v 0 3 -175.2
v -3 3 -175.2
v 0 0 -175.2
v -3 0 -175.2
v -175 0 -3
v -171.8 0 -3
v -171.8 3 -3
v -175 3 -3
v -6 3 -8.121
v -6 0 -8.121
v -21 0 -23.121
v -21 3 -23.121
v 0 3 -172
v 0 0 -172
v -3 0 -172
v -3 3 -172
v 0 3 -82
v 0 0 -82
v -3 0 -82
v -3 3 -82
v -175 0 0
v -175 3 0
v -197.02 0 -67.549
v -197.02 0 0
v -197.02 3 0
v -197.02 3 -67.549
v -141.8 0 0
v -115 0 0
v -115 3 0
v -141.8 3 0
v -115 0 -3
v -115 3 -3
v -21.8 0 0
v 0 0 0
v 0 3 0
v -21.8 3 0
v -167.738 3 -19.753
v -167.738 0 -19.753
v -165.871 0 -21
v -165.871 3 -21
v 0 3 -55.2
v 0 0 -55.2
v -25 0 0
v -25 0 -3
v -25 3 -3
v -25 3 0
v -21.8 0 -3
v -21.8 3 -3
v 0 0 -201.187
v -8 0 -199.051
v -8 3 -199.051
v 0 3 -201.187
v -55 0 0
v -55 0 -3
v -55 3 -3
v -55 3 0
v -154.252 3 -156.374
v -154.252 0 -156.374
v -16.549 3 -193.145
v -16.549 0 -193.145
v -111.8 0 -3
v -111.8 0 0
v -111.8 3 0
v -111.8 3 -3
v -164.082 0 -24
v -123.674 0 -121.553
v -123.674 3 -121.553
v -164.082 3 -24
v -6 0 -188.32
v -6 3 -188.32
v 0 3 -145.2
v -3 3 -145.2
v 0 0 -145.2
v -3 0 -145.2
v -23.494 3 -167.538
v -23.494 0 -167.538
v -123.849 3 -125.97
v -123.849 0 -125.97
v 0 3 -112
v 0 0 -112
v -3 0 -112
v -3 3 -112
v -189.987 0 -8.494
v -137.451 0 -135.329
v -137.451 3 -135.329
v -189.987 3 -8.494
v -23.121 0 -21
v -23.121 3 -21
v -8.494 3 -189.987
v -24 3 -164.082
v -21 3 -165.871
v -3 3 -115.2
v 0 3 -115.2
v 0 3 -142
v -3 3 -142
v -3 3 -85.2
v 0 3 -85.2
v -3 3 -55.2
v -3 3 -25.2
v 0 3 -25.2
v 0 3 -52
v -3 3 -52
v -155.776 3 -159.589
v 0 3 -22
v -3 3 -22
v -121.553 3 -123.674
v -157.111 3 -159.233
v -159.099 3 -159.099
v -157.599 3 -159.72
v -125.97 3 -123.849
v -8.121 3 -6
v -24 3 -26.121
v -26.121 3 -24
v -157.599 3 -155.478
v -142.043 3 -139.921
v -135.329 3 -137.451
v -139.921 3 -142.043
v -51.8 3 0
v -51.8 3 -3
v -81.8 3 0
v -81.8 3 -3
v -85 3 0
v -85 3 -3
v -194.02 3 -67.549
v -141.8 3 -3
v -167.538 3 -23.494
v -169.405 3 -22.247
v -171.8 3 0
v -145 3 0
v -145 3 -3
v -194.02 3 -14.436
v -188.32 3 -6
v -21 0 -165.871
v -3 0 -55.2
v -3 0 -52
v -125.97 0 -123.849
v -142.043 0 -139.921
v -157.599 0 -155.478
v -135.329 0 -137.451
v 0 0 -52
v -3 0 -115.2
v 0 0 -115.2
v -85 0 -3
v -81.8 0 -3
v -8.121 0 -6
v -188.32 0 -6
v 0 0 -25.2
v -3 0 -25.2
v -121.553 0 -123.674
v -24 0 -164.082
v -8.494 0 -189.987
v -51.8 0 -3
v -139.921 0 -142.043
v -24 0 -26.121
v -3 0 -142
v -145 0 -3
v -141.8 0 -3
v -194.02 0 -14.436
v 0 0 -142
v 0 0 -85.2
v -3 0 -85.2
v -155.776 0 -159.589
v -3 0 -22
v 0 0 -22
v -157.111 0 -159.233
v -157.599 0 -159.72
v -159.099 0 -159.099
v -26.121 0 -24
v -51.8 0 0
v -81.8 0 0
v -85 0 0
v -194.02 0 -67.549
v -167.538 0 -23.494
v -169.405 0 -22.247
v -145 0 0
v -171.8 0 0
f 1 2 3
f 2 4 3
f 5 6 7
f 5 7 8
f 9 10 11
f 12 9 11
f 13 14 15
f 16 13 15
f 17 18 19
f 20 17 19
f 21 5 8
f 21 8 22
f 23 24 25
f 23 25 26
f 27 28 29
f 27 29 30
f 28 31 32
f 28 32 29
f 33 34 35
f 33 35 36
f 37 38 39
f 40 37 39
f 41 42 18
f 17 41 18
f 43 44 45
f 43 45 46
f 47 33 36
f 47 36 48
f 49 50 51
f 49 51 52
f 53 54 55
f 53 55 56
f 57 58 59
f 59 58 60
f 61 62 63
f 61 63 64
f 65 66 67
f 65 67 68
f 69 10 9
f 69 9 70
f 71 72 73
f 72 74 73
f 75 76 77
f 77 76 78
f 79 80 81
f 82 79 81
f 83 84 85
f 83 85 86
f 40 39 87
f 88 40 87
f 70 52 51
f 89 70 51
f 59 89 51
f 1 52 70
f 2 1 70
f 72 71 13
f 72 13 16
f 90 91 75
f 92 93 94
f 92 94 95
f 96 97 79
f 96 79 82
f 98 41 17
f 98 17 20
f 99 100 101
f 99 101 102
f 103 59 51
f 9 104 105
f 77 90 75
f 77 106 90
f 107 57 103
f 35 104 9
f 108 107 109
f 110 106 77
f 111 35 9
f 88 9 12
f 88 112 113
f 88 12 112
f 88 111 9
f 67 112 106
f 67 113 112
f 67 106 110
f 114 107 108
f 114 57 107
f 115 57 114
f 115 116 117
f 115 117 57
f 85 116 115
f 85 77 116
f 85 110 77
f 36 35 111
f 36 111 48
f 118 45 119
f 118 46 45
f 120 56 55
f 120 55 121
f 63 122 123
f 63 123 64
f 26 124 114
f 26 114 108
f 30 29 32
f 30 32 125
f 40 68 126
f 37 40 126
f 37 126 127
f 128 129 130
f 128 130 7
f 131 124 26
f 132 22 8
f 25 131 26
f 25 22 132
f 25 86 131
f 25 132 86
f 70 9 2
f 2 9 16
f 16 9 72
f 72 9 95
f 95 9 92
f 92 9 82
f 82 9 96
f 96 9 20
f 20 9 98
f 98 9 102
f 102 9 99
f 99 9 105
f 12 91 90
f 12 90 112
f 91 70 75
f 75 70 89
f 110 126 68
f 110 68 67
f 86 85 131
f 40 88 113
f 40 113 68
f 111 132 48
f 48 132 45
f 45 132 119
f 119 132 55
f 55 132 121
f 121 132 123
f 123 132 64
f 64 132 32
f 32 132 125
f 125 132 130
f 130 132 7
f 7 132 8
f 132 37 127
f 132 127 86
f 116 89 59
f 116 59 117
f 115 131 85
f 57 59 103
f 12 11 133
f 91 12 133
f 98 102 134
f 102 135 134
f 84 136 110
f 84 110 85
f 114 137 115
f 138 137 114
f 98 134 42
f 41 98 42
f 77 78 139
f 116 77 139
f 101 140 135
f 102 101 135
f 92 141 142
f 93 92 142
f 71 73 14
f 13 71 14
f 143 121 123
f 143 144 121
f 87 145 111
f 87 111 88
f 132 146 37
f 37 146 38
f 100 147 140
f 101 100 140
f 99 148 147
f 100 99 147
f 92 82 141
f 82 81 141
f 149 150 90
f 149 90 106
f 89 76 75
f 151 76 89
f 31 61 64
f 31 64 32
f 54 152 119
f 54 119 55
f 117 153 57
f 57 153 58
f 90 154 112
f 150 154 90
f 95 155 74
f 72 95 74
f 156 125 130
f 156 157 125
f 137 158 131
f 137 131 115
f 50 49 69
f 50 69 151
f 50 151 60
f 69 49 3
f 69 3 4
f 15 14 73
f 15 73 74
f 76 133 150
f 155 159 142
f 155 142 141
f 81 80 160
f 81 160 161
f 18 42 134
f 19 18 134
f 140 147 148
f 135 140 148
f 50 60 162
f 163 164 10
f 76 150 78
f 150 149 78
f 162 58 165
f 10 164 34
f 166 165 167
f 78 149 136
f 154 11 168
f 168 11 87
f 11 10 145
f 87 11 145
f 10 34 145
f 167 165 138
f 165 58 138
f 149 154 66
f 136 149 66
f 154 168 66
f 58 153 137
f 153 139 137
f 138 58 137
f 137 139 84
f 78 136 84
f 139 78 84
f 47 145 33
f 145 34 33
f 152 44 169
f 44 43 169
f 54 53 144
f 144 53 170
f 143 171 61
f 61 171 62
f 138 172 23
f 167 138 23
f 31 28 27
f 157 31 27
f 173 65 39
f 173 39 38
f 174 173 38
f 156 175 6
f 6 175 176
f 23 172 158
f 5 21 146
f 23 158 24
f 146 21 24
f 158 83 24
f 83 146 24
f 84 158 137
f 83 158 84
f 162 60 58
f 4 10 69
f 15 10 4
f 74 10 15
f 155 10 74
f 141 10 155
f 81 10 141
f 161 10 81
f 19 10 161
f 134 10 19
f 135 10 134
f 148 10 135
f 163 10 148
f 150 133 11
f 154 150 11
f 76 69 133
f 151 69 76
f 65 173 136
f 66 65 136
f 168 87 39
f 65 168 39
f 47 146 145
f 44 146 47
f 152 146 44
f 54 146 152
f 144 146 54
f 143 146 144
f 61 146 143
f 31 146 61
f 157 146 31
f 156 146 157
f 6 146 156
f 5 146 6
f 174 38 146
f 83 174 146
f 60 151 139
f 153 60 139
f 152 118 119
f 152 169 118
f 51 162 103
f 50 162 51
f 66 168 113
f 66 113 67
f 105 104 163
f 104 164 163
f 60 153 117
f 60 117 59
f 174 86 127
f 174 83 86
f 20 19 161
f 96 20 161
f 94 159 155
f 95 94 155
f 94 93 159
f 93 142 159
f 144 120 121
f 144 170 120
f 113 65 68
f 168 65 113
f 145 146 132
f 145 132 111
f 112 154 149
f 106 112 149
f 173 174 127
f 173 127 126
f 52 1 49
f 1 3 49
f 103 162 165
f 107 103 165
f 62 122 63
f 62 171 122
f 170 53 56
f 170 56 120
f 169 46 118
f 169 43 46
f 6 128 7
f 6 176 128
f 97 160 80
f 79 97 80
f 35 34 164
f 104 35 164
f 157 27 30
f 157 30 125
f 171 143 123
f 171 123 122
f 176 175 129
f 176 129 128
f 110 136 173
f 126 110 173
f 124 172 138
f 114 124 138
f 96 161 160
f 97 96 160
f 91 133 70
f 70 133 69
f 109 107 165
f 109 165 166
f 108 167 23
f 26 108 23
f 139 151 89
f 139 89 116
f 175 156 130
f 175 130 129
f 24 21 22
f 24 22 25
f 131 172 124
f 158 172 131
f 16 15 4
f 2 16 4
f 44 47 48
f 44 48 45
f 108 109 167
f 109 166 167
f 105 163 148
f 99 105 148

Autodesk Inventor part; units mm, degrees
ref_plane "YZ Plane" through (0, 0, 0) normal (1, 0, 0) x (0, 1, 0)
ref_plane "XZ Plane" through (0, 0, 0) normal (0, 1, 0) x (-1, 0, 0)
ref_plane "XY Plane" through (0, 0, 0) normal (0, 0, 1) x (1, 0, 0)
sketch "草圖1" plane through (0, 0, 0) normal (0, 1, 0) x (-1, 0, 0)
  line L0 (0, 0) -> (0, -200)
  line L1 (0, 0) -> (200, 0)
  line L2 (0, 0) -> (141.4214, -141.4214)
  line L3 (200, 0) -> (141.4214, -141.4214)
  line L4 (141.4214, -141.4214) -> (0, -200)
  line L5 (191.0204, -6) -> (6, -6)
  line L6 (6, -6) -> (6, -191.0204)
  line L7 (6, -191.0204) -> (136.8292, -136.8292)
  line L8 (136.8292, -136.8292) -> (191.0204, -6)
  line L9 (2.1213, 0) -> (142.0427, -139.9214)
  line L10 (0, -2.1213) -> (139.9214, -142.0427)
  line L11 (168.5713, -21) -> (21, -21)
  line L12 (21, -21) -> (21, -168.5713)
  line L13 (21, -168.5713) -> (125.3487, -125.3487)
  line L14 (125.3487, -125.3487) -> (168.5713, -21)
  line L15 (164.0815, -24) -> (24, -24)
  line L16 (24, -24) -> (24, -164.0815)
  line L17 (24, -164.0815) -> (123.0526, -123.0526)
  line L18 (123.0526, -123.0526) -> (164.0815, -24)
  line L19 (191.0204, -6) -> (168.5713, -21)
  line L20 (191.8537, -7.2472) -> (169.4046, -22.2472)
  line L21 (190.187, -4.7528) -> (167.7379, -19.7528)
  line L22 (167.7379, -19.7528) -> (161.3815, -24)
  line L23 (169.4046, -22.2472) -> (163.0482, -26.4944)
  line L24 (24, -164.0815) -> (6, -191.0204)
  line L25 (25.2472, -164.9148) -> (7.2472, -191.8537)
  line L26 (22.7528, -163.2481) -> (4.7528, -190.187)
  line L27 (175, 0) -> (171.8, 0)
  line L28 (171.8, 0) -> (171.8, -3)
  line L29 (171.8, -3) -> (175, -3)
  line L30 (175, -3) -> (175, 0)
  line L31 (141.8, -3) -> (145, -3)
  line L32 (141.8, 0) -> (141.8, -3)
  line L33 (145, -3) -> (145, 0)
  line L34 (111.8, -3) -> (115, -3)
  line L35 (111.8, 0) -> (111.8, -3)
  line L36 (115, -3) -> (115, 0)
  line L37 (81.8, -3) -> (85, -3)
  line L38 (81.8, 0) -> (81.8, -3)
  line L39 (85, -3) -> (85, 0)
  line L40 (51.8, -3) -> (55, -3)
  line L41 (51.8, 0) -> (51.8, -3)
  line L42 (55, -3) -> (55, 0)
  line L43 (21.8, -3) -> (25, -3)
  line L44 (21.8, 0) -> (21.8, -3)
  line L45 (25, -3) -> (25, 0)
  line L46 (0, -200) -> (0, -222)
  line L47 (0, -222) -> (156.9777, -156.9777)
  line L48 (200, 0) -> (222, 0)
  line L49 (141.4214, -141.4214) -> (156.9777, -156.9777)
  line L50 (222, 0) -> (156.9777, -156.9777)
  line L51 (197.0204, 0) -> (197.0204, -60.3062)
  line L52 (0, -222) -> (0, -225)
  line L53 (0, -225) -> (159.099, -159.099)
  line L54 (156.9777, -156.9777) -> (159.099, -159.099)
  line L55 (159.099, -159.099) -> (225, 0)
  line L56 (222, 0) -> (225, 0)
  line L57 (197.0204, -60.3062) -> (197.0204, -67.5488)
  line L58 (0, -200) -> (0, -222)
  line L59 (6, -197.5147) -> (6, -219.5147)
  line L60 (194.0204, -67.5488) -> (194.0204, -14.4361)
  line L61 (142.0427, -139.9214) -> (157.599, -155.4777)
  line L62 (139.9214, -142.0427) -> (157.599, -159.7203)
  line L63 (0, -22) -> (3, -22)
  line L64 (3, -22) -> (3, -25.2)
  line L65 (3, -25.2) -> (0, -25.2)
  line L66 (0, -25.2) -> (0, -22)
  line L67 (3, -52) -> (3, -55.2)
  line L68 (0, -52) -> (3, -52)
  line L69 (3, -55.2) -> (0, -55.2)
  line L70 (3, -82) -> (3, -85.2)
  line L71 (0, -82) -> (3, -82)
  line L72 (3, -85.2) -> (0, -85.2)
  line L73 (3, -112) -> (3, -115.2)
  line L74 (0, -112) -> (3, -112)
  line L75 (3, -115.2) -> (0, -115.2)
  line L76 (3, -142) -> (3, -145.2)
  line L77 (0, -142) -> (3, -142)
  line L78 (3, -145.2) -> (0, -145.2)
  line L79 (3, -172) -> (3, -175.2)
  line L80 (0, -172) -> (3, -172)
  line L81 (3, -175.2) -> (0, -175.2)
  line L82 (155.4777, -157.599) -> (6, -197.5147)
  line L83 (155.7761, -159.5894) -> (8, -199.0507)
  line L84 (8, -199.0507) -> (8, -219.5147)
  line L85 (155.0907, -156.1498) -> (4.5, -196.3627)
  line L86 (4.5, -196.3627) -> (4.5, -219.5147)
  line L87 (155.7761, -159.5894) -> (158.7857, -158.7857)
  line L88 (8, -199.0507) -> (0, -201.187)
  point P0 (8.1213, -6)
  point P1 (137.4505, -135.3292)
  point P2 (135.3292, -137.4505)
  point P3 (6, -8.1213)
  point P4 (121.5526, -123.6739)
  point P5 (24, -26.1213)
  point P6 (21, -23.1213)
  point P7 (123.8487, -125.97)
  point P8 (123.6739, -121.5526)
  point P9 (125.97, -123.8487)
  point P10 (23.1213, -21)
  point P11 (26.1213, -24)
  point P12 (21, -165.8714)
  point P13 (6, -188.3204)
  point P14 (8.4944, -189.9871)
  point P15 (23.4944, -167.5381)
  point P16 (188.3204, -6)
  point P17 (165.8714, -21)
  point P18 (167.5381, -23.4944)
  point P19 (189.9871, -8.4944)
  point P20 (171.8, 0)
  point P21 (141.8, 0)
  point P22 (111.8, 0)
  point P23 (81.8, 0)
  point P24 (51.8, 0)
  point P25 (21.8, 0)
  point P26 (156.9777, -156.9777)
  point P27 (197.0204, -7.1935)
  point P28 (157.5991, -156.7203)
  point P29 (0, -25.2)
  point P30 (0, -55.2)
  point P31 (0, -85.2)
  point P32 (0, -115.2)
  point P33 (0, -145.2)
  point P34 (0, -175.2)
  point P35 (154.2524, -156.3737)
  point P36 (16.5488, -193.1453)
  point P37 (157.1115, -159.2328)
  point P38 (0, -201.187)
  dimension "d0" = 200
  dimension "d1" = 200
  dimension "d2" = 45
  dimension "d3" = 67.5
  dimension "d4" = 6
  dimension "d5" = 1.5
  dimension "d6" = 1.5
  dimension "d9" = 15
  dimension "d10" = 3
  dimension "d11" = 1.5
  dimension "d12" = 1.5
  dimension "d13" = 1.5
  dimension "d14" = 1.5
  dimension "d15" = 3
  dimension "d16" = 3.2
  dimension "d17" = 25
  dimension "d20" = 30
  dimension "d27" = 22
  dimension "d28" = 22
  dimension "d29" = 6
  dimension "d30" = 3
  dimension "d31" = 3
  dimension "d32" = 6
  dimension "d34" = 3
  dimension "d35" = 3
  dimension "d36" = 3.2
  dimension "d37" = 22
  dimension "d40" = 30
  dimension "d49" = 2
  dimension "d50" = 1.5
extrude "擠出1" add sketch "草圖1" along normal blind 3 contours L2 L6 L10 L0 | L1 L9 L5 L2 | L10 L6 L7 L4 L85 L86 L0 L81 L79 L80 L78 L76 L77 L75 L73 L74 L72 L70 L71 L69 L67 L68 L65 L64 L63 | L1 L44 L43 L45 L41 L40 L42 L38 L37 L39 L35 L34 L36 L32 L31 L33 L28 L29 L30 L51 L3 L9 L8 L5 | L5 L9 L11 L2 | L2 L12 L10 L6 | L11 L9 L15 L2 | L2 L16 L10 L12 | L26 L12 L24 L6 | L10 L16 L24 L12 | L5 L19 L11 L22 L21 | L11 L22 L15 L9 | L15 L9 L18 L2 | L2 L17 L10 L16 | L24 L13 L25 L7 | L8 L20 L23 L14 L19 | L11 L14 L23 L18 L15 L22 | L18 L9 L14 L2 | L2 L13 L10 L17 | L24 L17 L10 L13 | L18 L23 L14 L9 | L14 L9 L8 L2 | L2 L7 L10 L13 | L7 L2 L4 L10 | L9 L3 L2 L8 | L4 L49 L47 L62 | L61 L50 L49 L3 | L85 L62 L82 L4 | L4 L86 L85 | L3 L51 L50 L60 | L50 L57 L55 L54 | L54 L87 L62 L47 | L59 L88 L86 L4 | L82 L47 L83 L88 L59 | L62 L87 L83 L47 | L54 L53 L62 L87 | L86 L88 L46 L4
sketch "草圖2" plane through (-3, 0, -25.2) normal (0, 0, 1) x (1, 0, 0)
  line L0 (0, 0) -> (0, 3) projected
  line L1 (-154.599, 3) -> (-156.099, 3) projected
  line L2 (0, 0) -> (-3, 0)
  line L3 (-3, 0) -> (-3, 3)
  line L4 (-3, 3) -> (0, 3)
  line L5 (0, 3) -> (0, 0)
  circle A0 centre (-1.5, 1.5) radius 2.1213
  point P0 (3, 0)
  point P1 (3, 3)
  dimension "d45" = 3
  dimension "d46" = 4.2426
sketch "草圖3" plane through (-21.8, 0, -3) normal (-1, 0, 0) x (0, 0, 1)
  line L0 (0, 3) -> (-3, 3)
  line L1 (-3, 3) -> (-3, 0)
  line L2 (-3, 0) -> (0, 0)
  line L3 (0, 0) -> (0, 3)
  circle A0 centre (-1.5, 1.5) radius 2.1213
  point P0 (3, 0)
  dimension "d47" = 4.2426
  dimension "d48" = 1.5
properties part number "side_sail"
